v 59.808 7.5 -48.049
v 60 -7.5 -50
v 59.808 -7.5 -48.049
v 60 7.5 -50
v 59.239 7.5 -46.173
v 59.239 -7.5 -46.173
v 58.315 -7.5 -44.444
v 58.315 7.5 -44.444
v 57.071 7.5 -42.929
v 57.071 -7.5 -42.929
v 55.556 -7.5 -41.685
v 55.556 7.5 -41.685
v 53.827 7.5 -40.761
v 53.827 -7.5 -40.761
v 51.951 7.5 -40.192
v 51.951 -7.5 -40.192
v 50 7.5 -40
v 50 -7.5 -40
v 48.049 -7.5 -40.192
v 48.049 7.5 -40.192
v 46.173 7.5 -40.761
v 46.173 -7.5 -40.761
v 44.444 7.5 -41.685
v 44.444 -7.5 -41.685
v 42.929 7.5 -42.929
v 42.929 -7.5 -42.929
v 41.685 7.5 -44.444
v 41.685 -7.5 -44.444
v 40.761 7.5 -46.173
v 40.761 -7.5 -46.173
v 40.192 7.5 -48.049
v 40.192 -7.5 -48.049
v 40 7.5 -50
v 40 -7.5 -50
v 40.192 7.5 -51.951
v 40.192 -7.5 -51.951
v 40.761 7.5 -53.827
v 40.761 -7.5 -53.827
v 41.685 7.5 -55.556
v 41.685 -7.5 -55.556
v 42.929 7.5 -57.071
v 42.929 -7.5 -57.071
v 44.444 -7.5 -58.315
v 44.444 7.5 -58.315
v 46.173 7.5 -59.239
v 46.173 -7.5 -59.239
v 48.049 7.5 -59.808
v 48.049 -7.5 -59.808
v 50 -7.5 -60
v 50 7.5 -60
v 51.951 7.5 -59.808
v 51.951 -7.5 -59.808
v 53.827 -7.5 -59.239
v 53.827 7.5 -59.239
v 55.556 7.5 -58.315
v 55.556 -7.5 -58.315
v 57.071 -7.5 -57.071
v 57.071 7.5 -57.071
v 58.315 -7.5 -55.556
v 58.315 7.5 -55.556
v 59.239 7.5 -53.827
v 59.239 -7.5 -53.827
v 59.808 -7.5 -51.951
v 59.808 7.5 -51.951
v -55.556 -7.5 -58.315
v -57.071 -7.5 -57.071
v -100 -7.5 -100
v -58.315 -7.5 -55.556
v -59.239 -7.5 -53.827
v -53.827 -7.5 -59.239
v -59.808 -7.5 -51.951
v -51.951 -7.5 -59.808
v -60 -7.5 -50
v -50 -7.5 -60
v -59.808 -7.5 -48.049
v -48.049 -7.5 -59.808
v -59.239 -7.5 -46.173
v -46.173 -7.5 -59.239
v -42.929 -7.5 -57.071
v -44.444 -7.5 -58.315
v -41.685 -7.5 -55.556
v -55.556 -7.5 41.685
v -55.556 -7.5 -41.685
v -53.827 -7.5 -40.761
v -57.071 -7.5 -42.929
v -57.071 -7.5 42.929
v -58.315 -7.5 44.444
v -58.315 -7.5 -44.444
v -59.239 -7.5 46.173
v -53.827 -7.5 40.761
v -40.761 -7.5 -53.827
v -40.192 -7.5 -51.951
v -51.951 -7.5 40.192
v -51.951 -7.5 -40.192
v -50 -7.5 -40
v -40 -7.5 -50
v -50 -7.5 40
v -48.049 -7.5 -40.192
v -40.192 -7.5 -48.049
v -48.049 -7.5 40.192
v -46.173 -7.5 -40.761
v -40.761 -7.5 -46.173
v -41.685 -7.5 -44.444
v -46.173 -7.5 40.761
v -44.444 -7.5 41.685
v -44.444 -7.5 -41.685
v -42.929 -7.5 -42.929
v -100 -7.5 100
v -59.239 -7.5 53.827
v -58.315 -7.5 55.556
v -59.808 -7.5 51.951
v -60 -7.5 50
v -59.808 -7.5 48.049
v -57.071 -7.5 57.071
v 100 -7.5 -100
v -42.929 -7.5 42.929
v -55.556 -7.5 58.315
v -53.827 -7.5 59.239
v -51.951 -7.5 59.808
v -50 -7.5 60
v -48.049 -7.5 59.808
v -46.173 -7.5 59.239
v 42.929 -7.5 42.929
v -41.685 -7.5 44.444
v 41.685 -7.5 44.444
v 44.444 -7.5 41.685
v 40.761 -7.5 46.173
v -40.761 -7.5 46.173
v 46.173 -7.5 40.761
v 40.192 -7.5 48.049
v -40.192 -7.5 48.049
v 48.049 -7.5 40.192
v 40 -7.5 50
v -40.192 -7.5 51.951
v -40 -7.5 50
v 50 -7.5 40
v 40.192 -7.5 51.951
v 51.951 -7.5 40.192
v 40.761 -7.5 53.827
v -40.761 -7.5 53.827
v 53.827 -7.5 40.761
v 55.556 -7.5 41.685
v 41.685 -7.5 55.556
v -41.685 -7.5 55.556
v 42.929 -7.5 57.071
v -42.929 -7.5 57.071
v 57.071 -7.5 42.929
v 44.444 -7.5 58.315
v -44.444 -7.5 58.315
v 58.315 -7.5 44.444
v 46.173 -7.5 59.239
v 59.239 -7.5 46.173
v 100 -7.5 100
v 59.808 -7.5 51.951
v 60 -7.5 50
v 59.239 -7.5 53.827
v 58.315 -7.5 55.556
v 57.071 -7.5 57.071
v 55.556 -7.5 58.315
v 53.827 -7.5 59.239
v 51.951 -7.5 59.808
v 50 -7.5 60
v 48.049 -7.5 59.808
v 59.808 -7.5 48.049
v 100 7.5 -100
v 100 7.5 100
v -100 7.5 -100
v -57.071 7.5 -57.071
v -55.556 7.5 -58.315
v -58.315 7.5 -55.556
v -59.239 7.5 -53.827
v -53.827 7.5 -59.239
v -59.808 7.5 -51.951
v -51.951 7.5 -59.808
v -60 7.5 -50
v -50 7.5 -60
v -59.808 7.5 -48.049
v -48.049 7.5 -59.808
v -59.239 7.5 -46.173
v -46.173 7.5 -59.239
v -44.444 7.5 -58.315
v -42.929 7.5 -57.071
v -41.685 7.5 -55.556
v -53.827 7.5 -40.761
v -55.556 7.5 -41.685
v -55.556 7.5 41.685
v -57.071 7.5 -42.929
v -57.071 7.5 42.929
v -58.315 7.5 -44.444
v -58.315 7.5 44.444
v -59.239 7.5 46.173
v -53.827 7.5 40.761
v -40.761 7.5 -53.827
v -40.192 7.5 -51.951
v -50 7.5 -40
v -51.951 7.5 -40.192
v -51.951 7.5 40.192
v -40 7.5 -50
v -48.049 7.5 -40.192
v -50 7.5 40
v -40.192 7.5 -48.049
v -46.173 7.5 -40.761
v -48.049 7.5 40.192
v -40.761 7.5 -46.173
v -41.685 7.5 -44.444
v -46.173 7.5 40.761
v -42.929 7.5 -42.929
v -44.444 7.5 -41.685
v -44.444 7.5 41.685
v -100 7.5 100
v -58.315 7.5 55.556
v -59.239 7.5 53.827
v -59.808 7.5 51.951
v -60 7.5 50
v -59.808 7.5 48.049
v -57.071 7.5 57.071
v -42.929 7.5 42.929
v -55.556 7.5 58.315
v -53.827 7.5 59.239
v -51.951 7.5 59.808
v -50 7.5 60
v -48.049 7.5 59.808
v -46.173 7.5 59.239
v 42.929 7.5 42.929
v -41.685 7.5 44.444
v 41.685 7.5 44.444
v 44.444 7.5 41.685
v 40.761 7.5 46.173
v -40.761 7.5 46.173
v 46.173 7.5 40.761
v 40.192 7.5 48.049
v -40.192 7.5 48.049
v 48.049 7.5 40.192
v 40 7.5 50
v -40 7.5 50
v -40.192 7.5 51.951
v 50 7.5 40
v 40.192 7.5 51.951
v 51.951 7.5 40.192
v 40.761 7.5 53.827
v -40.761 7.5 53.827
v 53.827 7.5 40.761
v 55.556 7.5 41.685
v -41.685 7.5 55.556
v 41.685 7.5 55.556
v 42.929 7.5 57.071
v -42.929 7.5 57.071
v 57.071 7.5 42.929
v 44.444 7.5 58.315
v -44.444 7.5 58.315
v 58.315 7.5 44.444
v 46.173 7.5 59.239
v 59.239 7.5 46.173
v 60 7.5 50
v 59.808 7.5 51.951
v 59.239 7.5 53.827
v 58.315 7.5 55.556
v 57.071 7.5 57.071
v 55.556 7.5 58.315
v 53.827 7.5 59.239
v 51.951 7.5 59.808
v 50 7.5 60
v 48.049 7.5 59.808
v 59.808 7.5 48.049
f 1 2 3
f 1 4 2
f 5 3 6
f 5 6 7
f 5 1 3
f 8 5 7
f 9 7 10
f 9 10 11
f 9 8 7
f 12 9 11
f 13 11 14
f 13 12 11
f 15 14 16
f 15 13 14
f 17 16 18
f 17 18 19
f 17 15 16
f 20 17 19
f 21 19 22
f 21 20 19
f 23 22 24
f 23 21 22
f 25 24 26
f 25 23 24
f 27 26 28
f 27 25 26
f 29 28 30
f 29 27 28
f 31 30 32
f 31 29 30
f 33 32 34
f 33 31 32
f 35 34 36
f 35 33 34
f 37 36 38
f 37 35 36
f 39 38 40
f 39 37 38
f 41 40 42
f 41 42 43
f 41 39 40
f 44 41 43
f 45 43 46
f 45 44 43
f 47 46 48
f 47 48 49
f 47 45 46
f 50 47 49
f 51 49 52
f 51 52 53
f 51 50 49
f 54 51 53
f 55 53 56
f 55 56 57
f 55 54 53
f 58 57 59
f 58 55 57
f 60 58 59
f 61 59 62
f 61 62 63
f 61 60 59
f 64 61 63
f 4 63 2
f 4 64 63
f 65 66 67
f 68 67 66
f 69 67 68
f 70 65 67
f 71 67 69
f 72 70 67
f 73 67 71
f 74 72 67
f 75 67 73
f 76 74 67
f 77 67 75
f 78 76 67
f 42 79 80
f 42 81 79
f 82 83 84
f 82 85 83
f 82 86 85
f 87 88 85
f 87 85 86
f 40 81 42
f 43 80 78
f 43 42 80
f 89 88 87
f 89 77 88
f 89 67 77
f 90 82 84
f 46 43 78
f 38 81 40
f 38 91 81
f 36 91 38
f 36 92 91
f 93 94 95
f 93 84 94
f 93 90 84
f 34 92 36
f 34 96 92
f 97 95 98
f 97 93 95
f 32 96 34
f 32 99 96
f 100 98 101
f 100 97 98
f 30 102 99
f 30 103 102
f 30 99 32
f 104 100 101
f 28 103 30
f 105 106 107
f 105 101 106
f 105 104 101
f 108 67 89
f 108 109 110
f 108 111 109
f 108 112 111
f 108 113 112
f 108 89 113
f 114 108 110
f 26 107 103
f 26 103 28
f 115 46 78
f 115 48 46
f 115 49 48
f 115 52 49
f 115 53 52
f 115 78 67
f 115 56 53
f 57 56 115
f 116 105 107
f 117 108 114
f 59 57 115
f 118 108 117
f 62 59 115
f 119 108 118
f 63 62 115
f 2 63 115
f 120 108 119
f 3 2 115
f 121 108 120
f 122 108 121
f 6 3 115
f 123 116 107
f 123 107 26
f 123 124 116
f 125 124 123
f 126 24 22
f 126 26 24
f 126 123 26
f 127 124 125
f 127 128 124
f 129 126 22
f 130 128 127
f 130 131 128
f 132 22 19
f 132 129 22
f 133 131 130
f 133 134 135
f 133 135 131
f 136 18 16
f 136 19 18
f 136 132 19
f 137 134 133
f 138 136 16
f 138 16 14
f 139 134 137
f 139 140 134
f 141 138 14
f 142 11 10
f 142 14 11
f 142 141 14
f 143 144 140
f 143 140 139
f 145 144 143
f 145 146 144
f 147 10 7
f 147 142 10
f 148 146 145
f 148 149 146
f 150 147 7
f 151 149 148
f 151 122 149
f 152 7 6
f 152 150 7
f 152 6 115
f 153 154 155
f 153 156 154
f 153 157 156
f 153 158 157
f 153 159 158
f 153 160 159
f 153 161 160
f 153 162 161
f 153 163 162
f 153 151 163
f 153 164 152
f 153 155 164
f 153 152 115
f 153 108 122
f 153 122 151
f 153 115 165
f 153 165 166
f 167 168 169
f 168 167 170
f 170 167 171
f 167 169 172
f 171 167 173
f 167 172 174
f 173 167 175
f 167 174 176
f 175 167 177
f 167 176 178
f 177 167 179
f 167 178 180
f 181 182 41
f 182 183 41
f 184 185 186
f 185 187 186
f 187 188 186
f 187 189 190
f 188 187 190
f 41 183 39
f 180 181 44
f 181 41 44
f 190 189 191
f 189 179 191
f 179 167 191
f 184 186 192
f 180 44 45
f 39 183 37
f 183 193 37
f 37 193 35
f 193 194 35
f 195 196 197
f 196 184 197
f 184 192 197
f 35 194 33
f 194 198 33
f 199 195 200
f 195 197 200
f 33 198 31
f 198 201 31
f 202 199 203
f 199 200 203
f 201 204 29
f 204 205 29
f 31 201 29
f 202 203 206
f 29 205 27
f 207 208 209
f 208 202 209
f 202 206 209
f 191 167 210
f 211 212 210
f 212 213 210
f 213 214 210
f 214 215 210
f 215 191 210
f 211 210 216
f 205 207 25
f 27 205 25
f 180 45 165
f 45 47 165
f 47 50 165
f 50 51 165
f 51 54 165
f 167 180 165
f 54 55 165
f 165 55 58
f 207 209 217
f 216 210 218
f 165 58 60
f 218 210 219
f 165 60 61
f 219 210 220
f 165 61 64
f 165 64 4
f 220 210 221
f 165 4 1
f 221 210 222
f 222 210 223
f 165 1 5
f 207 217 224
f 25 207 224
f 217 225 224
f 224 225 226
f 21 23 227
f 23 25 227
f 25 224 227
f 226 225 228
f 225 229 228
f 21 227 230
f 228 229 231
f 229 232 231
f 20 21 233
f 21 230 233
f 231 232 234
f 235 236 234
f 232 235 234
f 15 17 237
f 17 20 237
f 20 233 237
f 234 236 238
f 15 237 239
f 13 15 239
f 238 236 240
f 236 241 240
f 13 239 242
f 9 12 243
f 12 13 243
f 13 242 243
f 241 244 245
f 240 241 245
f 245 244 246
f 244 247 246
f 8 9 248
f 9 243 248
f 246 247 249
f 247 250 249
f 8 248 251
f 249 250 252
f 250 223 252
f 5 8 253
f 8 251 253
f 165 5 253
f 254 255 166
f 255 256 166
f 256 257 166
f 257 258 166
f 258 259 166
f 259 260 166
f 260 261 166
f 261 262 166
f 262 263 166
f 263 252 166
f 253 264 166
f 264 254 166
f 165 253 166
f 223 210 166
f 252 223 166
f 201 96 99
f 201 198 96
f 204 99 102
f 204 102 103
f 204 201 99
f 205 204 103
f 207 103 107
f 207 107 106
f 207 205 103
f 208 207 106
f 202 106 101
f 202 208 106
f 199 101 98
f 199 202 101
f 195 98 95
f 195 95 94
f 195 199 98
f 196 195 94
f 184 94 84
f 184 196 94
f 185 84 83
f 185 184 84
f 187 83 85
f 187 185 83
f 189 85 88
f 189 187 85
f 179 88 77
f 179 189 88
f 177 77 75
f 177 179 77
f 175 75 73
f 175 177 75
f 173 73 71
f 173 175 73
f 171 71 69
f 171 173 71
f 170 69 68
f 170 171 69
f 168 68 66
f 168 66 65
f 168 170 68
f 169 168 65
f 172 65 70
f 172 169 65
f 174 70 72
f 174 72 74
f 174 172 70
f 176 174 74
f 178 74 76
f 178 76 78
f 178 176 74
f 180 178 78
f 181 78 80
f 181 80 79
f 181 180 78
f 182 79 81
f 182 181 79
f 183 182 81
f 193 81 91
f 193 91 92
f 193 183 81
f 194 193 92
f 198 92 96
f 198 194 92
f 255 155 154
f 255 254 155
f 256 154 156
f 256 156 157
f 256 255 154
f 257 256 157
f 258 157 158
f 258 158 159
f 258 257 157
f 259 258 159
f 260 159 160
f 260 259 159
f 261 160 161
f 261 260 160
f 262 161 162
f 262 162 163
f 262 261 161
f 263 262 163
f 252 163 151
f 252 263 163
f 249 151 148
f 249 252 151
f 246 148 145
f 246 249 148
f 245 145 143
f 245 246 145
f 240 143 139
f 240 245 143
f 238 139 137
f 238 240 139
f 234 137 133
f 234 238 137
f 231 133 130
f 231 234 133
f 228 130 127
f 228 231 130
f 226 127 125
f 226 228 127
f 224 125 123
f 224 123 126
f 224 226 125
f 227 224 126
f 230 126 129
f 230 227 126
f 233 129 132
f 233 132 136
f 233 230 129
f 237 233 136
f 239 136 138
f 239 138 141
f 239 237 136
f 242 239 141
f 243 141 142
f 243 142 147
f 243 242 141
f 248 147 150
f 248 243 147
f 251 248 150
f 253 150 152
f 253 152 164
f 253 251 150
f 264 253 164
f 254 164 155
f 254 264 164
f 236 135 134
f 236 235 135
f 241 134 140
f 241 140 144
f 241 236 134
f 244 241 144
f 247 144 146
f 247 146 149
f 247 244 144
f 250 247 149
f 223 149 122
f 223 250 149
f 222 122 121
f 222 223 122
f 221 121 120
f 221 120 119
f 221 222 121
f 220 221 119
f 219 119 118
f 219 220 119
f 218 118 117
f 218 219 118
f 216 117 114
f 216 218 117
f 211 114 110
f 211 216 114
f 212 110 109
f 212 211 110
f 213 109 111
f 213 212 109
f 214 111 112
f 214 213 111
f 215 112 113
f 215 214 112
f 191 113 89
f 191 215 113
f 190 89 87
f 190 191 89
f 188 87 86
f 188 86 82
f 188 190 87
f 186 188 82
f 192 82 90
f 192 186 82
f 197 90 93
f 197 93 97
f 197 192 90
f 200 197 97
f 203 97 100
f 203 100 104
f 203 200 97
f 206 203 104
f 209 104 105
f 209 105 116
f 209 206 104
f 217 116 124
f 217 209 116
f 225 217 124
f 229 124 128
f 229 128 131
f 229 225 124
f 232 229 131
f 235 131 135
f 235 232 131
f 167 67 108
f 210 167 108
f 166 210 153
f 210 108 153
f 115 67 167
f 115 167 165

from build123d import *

# Parameters (mm, degrees)
F0_W     = 200
F0_H     = 200
F0_R     = 10
F1_DEPTH = 7.5


with BuildPart() as f1:
    # F0 (on Front) → F1 (new body, symmetric)
    with BuildSketch(Plane.XZ):
        Rectangle(F0_W, F0_H)
        with Locations((-50, -50)):
            Circle(F0_R, mode=Mode.SUBTRACT)
        with Locations((50, -50)):
            Circle(F0_R, mode=Mode.SUBTRACT)
        with Locations((-50, 50)):
            Circle(F0_R, mode=Mode.SUBTRACT)
        with Locations((50, 50)):
            Circle(F0_R, mode=Mode.SUBTRACT)
    extrude(amount=F1_DEPTH, both=True)


solid = f1.part
